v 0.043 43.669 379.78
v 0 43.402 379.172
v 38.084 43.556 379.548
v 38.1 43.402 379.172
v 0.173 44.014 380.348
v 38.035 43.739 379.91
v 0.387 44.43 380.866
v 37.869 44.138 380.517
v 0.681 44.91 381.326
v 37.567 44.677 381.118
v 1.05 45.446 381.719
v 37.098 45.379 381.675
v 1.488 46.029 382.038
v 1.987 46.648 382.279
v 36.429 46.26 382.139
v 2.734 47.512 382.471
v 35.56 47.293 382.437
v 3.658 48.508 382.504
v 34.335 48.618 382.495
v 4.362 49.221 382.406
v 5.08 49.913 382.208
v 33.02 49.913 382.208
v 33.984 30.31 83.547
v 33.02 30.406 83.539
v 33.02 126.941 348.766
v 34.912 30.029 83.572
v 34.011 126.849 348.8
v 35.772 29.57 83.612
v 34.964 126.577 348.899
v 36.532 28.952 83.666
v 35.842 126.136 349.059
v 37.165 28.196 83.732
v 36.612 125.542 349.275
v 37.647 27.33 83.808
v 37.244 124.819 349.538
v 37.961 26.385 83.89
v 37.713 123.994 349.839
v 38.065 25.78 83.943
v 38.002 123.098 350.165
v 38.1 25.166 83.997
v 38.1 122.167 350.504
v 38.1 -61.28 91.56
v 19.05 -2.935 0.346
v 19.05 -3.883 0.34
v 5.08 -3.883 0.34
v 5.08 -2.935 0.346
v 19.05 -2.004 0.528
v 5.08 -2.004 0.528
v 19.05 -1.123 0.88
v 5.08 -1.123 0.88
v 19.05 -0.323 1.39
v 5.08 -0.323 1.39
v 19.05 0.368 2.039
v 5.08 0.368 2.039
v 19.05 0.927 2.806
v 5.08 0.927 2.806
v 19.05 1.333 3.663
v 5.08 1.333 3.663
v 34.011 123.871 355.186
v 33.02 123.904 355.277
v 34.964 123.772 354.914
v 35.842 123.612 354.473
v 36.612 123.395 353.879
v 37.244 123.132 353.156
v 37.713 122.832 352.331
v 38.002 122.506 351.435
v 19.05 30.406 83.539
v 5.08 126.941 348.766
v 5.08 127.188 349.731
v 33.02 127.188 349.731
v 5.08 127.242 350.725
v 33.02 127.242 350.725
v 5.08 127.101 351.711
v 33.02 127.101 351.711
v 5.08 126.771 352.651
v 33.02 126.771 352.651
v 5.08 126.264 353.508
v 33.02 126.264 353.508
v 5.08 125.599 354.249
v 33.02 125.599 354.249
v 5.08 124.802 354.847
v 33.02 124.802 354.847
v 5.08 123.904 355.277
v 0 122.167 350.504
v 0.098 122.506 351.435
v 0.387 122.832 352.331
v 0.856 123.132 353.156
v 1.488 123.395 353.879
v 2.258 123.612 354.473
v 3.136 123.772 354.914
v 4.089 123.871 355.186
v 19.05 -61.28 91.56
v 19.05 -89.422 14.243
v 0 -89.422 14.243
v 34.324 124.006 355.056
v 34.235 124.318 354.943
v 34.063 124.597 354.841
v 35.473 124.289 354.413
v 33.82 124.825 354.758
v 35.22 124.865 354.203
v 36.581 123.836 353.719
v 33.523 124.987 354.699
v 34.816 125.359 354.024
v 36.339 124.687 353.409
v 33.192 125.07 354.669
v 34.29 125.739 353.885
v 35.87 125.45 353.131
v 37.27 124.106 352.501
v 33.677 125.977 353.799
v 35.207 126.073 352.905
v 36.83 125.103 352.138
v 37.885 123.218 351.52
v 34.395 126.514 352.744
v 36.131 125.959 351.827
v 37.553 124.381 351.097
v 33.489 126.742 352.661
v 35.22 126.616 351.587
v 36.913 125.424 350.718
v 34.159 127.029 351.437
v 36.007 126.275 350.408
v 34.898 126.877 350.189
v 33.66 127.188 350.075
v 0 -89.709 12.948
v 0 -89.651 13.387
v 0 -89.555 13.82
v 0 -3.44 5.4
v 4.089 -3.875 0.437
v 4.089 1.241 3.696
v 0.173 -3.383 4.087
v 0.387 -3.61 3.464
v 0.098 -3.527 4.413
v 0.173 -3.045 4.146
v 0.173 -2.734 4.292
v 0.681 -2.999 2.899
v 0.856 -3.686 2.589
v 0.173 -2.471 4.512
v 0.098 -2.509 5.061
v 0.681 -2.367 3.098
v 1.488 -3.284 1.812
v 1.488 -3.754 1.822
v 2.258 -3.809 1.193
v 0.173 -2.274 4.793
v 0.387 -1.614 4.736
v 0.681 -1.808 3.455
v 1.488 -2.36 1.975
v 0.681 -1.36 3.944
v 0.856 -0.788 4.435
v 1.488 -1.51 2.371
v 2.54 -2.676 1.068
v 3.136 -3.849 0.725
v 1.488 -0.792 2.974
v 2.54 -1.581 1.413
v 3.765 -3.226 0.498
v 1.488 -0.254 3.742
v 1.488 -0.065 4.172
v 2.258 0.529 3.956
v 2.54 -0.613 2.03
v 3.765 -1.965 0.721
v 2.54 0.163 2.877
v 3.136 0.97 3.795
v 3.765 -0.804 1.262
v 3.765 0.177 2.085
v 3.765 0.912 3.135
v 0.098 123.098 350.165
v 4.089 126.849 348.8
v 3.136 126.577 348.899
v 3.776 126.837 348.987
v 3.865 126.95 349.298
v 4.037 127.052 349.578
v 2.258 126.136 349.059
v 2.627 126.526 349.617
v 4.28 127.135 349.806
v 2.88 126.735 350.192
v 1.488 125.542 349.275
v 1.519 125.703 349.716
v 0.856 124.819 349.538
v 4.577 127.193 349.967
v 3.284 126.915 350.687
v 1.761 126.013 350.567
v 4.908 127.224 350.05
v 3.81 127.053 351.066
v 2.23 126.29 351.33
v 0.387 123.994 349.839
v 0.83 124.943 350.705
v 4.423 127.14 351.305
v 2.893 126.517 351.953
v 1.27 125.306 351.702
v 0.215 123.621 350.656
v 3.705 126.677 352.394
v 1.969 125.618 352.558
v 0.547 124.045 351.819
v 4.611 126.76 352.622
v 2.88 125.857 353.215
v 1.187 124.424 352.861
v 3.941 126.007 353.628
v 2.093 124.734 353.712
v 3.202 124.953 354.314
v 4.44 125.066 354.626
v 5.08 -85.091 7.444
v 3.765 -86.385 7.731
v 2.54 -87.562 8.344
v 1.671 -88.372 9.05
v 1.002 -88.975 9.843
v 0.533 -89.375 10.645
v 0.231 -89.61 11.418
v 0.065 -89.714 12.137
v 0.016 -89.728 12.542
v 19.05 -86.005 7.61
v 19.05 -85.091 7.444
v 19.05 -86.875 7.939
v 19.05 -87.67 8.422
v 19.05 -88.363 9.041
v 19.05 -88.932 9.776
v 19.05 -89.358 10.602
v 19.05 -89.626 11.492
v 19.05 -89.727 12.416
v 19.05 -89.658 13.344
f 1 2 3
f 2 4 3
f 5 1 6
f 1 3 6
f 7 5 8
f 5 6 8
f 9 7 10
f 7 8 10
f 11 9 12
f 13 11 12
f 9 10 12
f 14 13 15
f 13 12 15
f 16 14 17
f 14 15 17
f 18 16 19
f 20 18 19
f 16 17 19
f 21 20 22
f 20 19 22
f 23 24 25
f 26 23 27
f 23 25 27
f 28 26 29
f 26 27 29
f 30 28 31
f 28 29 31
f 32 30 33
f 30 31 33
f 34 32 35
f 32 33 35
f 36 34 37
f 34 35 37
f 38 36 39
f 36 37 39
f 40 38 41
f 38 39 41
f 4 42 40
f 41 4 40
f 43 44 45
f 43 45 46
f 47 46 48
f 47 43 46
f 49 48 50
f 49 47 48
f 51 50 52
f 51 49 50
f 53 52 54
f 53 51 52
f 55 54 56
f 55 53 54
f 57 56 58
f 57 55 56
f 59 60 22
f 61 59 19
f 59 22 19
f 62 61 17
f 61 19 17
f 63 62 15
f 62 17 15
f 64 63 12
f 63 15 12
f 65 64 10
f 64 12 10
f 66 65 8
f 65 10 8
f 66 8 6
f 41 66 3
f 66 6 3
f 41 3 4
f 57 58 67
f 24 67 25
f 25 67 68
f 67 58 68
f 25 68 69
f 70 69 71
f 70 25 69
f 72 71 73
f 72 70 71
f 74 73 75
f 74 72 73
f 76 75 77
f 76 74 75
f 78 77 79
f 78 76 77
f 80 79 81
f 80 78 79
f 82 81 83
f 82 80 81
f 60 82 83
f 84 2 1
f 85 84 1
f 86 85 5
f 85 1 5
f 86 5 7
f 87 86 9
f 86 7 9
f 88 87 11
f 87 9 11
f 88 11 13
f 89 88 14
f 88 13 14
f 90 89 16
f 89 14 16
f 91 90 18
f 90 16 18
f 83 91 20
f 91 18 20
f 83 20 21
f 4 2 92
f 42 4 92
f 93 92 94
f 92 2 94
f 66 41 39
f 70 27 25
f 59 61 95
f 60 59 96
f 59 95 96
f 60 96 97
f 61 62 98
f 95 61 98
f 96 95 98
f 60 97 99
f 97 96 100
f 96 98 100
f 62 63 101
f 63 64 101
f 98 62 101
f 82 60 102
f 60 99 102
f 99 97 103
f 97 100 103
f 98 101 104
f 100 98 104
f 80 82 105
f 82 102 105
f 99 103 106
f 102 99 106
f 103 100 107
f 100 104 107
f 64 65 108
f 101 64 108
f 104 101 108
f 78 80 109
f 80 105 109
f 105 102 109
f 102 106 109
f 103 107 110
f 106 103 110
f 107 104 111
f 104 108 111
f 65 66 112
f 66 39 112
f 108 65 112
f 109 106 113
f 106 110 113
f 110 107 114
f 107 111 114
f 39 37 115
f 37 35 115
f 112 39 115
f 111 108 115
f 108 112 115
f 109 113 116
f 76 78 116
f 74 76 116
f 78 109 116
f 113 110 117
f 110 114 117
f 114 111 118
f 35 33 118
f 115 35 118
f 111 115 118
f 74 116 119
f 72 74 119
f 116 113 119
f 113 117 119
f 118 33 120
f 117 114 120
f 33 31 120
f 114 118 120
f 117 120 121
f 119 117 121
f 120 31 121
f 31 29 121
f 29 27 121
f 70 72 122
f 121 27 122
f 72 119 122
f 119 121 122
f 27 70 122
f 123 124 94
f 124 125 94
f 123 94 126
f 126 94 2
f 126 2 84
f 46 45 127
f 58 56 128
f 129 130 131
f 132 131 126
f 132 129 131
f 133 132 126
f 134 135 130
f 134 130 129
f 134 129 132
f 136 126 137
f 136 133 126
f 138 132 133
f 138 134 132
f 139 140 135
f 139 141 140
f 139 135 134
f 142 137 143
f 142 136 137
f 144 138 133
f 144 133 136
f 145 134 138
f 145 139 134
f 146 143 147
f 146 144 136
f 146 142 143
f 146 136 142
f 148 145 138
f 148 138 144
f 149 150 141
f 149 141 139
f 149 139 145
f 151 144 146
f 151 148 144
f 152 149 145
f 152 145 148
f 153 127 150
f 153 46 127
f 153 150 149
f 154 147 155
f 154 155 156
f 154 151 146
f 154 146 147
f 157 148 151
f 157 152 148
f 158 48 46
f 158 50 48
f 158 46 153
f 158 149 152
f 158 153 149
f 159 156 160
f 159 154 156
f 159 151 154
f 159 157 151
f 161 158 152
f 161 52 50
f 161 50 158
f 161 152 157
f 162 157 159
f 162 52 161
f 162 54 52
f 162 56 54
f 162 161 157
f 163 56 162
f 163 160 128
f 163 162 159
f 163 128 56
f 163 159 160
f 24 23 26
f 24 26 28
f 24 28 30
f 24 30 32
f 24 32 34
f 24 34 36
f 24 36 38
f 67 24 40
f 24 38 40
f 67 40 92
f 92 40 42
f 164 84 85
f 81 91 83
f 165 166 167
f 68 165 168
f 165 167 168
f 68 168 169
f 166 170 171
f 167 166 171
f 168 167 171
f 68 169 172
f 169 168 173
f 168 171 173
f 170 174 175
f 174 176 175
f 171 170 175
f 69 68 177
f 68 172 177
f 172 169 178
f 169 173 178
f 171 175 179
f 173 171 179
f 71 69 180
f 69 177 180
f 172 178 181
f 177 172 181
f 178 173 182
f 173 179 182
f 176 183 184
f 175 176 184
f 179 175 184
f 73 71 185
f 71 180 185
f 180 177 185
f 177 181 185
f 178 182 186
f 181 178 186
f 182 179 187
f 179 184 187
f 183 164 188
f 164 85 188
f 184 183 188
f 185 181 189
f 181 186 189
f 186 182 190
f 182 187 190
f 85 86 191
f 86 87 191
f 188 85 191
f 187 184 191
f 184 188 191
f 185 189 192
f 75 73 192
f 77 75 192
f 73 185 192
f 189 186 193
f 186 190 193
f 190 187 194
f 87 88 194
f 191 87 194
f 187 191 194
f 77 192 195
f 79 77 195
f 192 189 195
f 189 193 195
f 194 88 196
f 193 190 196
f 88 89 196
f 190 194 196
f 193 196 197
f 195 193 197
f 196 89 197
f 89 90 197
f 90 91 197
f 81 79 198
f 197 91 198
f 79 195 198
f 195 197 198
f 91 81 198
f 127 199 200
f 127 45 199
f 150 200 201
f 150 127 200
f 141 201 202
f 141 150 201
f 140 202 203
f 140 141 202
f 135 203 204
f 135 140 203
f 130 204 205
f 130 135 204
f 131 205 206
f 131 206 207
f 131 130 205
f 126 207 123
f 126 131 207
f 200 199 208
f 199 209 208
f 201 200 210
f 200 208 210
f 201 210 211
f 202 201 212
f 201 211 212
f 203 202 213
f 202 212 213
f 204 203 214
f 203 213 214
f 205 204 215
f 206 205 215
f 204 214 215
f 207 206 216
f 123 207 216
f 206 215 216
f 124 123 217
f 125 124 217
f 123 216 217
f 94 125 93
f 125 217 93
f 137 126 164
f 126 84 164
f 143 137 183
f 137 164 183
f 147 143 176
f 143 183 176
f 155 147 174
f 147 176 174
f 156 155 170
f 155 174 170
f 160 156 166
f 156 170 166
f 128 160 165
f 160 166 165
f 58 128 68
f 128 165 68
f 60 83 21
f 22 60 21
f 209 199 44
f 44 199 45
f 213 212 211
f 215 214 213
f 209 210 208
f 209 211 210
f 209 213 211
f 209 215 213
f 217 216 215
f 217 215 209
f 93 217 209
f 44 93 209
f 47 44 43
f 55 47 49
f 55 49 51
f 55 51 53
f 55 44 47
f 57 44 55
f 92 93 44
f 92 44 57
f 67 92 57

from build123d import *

# Parameters (mm, degrees)
F1_DEPTH = 38.1
F3_DEPTH = 19.05
F4_R     = 5.08


# Not quite as in the source:
# - a feature names something its author has since deleted; it is built from what else it names


with BuildPart() as f1:
    # F0 (on Right) → F1 (new body)
    with BuildSketch(Plane.YZ):
        Polygon((-91.6858274725, 8.0214705098), (0, 0), (128.6780048528, 353.5399127136), (45.1393308649, 383.9455034552), align=None)
    extrude(amount=F1_DEPTH)

    # F2 (on face) → F3 (cut)
    with BuildSketch(Plane.YZ.offset(38.1)):
        Polygon((-92.758420577, 5.074545175), (34.3168153471, -6.0430973832), (0, 0), (30.4055907417, 83.5386739879), (-61.2802367308, 91.5601444977), align=None)
    extrude(amount=-F3_DEPTH, mode=Mode.SUBTRACT)

    # F4
    f4_edges = [f1.edges().sort_by_distance(p)[0] for p in [
        (0, 86.908668, 368.742708),
        (0, 64.339002, 176.769956),
        (38.1, 79.541798, 218.539293),
        (9.525, 0, 0),
        (0, -45.842914, 4.010735),
        (9.525, -91.685827, 8.021471),
        (38.1, 86.908668, 368.742708),
        (19.05, 128.678005, 353.539913),
        (19.05, 45.139331, 383.945503),
    ]]
    fillet(f4_edges, radius=F4_R)


solid = f1.part
